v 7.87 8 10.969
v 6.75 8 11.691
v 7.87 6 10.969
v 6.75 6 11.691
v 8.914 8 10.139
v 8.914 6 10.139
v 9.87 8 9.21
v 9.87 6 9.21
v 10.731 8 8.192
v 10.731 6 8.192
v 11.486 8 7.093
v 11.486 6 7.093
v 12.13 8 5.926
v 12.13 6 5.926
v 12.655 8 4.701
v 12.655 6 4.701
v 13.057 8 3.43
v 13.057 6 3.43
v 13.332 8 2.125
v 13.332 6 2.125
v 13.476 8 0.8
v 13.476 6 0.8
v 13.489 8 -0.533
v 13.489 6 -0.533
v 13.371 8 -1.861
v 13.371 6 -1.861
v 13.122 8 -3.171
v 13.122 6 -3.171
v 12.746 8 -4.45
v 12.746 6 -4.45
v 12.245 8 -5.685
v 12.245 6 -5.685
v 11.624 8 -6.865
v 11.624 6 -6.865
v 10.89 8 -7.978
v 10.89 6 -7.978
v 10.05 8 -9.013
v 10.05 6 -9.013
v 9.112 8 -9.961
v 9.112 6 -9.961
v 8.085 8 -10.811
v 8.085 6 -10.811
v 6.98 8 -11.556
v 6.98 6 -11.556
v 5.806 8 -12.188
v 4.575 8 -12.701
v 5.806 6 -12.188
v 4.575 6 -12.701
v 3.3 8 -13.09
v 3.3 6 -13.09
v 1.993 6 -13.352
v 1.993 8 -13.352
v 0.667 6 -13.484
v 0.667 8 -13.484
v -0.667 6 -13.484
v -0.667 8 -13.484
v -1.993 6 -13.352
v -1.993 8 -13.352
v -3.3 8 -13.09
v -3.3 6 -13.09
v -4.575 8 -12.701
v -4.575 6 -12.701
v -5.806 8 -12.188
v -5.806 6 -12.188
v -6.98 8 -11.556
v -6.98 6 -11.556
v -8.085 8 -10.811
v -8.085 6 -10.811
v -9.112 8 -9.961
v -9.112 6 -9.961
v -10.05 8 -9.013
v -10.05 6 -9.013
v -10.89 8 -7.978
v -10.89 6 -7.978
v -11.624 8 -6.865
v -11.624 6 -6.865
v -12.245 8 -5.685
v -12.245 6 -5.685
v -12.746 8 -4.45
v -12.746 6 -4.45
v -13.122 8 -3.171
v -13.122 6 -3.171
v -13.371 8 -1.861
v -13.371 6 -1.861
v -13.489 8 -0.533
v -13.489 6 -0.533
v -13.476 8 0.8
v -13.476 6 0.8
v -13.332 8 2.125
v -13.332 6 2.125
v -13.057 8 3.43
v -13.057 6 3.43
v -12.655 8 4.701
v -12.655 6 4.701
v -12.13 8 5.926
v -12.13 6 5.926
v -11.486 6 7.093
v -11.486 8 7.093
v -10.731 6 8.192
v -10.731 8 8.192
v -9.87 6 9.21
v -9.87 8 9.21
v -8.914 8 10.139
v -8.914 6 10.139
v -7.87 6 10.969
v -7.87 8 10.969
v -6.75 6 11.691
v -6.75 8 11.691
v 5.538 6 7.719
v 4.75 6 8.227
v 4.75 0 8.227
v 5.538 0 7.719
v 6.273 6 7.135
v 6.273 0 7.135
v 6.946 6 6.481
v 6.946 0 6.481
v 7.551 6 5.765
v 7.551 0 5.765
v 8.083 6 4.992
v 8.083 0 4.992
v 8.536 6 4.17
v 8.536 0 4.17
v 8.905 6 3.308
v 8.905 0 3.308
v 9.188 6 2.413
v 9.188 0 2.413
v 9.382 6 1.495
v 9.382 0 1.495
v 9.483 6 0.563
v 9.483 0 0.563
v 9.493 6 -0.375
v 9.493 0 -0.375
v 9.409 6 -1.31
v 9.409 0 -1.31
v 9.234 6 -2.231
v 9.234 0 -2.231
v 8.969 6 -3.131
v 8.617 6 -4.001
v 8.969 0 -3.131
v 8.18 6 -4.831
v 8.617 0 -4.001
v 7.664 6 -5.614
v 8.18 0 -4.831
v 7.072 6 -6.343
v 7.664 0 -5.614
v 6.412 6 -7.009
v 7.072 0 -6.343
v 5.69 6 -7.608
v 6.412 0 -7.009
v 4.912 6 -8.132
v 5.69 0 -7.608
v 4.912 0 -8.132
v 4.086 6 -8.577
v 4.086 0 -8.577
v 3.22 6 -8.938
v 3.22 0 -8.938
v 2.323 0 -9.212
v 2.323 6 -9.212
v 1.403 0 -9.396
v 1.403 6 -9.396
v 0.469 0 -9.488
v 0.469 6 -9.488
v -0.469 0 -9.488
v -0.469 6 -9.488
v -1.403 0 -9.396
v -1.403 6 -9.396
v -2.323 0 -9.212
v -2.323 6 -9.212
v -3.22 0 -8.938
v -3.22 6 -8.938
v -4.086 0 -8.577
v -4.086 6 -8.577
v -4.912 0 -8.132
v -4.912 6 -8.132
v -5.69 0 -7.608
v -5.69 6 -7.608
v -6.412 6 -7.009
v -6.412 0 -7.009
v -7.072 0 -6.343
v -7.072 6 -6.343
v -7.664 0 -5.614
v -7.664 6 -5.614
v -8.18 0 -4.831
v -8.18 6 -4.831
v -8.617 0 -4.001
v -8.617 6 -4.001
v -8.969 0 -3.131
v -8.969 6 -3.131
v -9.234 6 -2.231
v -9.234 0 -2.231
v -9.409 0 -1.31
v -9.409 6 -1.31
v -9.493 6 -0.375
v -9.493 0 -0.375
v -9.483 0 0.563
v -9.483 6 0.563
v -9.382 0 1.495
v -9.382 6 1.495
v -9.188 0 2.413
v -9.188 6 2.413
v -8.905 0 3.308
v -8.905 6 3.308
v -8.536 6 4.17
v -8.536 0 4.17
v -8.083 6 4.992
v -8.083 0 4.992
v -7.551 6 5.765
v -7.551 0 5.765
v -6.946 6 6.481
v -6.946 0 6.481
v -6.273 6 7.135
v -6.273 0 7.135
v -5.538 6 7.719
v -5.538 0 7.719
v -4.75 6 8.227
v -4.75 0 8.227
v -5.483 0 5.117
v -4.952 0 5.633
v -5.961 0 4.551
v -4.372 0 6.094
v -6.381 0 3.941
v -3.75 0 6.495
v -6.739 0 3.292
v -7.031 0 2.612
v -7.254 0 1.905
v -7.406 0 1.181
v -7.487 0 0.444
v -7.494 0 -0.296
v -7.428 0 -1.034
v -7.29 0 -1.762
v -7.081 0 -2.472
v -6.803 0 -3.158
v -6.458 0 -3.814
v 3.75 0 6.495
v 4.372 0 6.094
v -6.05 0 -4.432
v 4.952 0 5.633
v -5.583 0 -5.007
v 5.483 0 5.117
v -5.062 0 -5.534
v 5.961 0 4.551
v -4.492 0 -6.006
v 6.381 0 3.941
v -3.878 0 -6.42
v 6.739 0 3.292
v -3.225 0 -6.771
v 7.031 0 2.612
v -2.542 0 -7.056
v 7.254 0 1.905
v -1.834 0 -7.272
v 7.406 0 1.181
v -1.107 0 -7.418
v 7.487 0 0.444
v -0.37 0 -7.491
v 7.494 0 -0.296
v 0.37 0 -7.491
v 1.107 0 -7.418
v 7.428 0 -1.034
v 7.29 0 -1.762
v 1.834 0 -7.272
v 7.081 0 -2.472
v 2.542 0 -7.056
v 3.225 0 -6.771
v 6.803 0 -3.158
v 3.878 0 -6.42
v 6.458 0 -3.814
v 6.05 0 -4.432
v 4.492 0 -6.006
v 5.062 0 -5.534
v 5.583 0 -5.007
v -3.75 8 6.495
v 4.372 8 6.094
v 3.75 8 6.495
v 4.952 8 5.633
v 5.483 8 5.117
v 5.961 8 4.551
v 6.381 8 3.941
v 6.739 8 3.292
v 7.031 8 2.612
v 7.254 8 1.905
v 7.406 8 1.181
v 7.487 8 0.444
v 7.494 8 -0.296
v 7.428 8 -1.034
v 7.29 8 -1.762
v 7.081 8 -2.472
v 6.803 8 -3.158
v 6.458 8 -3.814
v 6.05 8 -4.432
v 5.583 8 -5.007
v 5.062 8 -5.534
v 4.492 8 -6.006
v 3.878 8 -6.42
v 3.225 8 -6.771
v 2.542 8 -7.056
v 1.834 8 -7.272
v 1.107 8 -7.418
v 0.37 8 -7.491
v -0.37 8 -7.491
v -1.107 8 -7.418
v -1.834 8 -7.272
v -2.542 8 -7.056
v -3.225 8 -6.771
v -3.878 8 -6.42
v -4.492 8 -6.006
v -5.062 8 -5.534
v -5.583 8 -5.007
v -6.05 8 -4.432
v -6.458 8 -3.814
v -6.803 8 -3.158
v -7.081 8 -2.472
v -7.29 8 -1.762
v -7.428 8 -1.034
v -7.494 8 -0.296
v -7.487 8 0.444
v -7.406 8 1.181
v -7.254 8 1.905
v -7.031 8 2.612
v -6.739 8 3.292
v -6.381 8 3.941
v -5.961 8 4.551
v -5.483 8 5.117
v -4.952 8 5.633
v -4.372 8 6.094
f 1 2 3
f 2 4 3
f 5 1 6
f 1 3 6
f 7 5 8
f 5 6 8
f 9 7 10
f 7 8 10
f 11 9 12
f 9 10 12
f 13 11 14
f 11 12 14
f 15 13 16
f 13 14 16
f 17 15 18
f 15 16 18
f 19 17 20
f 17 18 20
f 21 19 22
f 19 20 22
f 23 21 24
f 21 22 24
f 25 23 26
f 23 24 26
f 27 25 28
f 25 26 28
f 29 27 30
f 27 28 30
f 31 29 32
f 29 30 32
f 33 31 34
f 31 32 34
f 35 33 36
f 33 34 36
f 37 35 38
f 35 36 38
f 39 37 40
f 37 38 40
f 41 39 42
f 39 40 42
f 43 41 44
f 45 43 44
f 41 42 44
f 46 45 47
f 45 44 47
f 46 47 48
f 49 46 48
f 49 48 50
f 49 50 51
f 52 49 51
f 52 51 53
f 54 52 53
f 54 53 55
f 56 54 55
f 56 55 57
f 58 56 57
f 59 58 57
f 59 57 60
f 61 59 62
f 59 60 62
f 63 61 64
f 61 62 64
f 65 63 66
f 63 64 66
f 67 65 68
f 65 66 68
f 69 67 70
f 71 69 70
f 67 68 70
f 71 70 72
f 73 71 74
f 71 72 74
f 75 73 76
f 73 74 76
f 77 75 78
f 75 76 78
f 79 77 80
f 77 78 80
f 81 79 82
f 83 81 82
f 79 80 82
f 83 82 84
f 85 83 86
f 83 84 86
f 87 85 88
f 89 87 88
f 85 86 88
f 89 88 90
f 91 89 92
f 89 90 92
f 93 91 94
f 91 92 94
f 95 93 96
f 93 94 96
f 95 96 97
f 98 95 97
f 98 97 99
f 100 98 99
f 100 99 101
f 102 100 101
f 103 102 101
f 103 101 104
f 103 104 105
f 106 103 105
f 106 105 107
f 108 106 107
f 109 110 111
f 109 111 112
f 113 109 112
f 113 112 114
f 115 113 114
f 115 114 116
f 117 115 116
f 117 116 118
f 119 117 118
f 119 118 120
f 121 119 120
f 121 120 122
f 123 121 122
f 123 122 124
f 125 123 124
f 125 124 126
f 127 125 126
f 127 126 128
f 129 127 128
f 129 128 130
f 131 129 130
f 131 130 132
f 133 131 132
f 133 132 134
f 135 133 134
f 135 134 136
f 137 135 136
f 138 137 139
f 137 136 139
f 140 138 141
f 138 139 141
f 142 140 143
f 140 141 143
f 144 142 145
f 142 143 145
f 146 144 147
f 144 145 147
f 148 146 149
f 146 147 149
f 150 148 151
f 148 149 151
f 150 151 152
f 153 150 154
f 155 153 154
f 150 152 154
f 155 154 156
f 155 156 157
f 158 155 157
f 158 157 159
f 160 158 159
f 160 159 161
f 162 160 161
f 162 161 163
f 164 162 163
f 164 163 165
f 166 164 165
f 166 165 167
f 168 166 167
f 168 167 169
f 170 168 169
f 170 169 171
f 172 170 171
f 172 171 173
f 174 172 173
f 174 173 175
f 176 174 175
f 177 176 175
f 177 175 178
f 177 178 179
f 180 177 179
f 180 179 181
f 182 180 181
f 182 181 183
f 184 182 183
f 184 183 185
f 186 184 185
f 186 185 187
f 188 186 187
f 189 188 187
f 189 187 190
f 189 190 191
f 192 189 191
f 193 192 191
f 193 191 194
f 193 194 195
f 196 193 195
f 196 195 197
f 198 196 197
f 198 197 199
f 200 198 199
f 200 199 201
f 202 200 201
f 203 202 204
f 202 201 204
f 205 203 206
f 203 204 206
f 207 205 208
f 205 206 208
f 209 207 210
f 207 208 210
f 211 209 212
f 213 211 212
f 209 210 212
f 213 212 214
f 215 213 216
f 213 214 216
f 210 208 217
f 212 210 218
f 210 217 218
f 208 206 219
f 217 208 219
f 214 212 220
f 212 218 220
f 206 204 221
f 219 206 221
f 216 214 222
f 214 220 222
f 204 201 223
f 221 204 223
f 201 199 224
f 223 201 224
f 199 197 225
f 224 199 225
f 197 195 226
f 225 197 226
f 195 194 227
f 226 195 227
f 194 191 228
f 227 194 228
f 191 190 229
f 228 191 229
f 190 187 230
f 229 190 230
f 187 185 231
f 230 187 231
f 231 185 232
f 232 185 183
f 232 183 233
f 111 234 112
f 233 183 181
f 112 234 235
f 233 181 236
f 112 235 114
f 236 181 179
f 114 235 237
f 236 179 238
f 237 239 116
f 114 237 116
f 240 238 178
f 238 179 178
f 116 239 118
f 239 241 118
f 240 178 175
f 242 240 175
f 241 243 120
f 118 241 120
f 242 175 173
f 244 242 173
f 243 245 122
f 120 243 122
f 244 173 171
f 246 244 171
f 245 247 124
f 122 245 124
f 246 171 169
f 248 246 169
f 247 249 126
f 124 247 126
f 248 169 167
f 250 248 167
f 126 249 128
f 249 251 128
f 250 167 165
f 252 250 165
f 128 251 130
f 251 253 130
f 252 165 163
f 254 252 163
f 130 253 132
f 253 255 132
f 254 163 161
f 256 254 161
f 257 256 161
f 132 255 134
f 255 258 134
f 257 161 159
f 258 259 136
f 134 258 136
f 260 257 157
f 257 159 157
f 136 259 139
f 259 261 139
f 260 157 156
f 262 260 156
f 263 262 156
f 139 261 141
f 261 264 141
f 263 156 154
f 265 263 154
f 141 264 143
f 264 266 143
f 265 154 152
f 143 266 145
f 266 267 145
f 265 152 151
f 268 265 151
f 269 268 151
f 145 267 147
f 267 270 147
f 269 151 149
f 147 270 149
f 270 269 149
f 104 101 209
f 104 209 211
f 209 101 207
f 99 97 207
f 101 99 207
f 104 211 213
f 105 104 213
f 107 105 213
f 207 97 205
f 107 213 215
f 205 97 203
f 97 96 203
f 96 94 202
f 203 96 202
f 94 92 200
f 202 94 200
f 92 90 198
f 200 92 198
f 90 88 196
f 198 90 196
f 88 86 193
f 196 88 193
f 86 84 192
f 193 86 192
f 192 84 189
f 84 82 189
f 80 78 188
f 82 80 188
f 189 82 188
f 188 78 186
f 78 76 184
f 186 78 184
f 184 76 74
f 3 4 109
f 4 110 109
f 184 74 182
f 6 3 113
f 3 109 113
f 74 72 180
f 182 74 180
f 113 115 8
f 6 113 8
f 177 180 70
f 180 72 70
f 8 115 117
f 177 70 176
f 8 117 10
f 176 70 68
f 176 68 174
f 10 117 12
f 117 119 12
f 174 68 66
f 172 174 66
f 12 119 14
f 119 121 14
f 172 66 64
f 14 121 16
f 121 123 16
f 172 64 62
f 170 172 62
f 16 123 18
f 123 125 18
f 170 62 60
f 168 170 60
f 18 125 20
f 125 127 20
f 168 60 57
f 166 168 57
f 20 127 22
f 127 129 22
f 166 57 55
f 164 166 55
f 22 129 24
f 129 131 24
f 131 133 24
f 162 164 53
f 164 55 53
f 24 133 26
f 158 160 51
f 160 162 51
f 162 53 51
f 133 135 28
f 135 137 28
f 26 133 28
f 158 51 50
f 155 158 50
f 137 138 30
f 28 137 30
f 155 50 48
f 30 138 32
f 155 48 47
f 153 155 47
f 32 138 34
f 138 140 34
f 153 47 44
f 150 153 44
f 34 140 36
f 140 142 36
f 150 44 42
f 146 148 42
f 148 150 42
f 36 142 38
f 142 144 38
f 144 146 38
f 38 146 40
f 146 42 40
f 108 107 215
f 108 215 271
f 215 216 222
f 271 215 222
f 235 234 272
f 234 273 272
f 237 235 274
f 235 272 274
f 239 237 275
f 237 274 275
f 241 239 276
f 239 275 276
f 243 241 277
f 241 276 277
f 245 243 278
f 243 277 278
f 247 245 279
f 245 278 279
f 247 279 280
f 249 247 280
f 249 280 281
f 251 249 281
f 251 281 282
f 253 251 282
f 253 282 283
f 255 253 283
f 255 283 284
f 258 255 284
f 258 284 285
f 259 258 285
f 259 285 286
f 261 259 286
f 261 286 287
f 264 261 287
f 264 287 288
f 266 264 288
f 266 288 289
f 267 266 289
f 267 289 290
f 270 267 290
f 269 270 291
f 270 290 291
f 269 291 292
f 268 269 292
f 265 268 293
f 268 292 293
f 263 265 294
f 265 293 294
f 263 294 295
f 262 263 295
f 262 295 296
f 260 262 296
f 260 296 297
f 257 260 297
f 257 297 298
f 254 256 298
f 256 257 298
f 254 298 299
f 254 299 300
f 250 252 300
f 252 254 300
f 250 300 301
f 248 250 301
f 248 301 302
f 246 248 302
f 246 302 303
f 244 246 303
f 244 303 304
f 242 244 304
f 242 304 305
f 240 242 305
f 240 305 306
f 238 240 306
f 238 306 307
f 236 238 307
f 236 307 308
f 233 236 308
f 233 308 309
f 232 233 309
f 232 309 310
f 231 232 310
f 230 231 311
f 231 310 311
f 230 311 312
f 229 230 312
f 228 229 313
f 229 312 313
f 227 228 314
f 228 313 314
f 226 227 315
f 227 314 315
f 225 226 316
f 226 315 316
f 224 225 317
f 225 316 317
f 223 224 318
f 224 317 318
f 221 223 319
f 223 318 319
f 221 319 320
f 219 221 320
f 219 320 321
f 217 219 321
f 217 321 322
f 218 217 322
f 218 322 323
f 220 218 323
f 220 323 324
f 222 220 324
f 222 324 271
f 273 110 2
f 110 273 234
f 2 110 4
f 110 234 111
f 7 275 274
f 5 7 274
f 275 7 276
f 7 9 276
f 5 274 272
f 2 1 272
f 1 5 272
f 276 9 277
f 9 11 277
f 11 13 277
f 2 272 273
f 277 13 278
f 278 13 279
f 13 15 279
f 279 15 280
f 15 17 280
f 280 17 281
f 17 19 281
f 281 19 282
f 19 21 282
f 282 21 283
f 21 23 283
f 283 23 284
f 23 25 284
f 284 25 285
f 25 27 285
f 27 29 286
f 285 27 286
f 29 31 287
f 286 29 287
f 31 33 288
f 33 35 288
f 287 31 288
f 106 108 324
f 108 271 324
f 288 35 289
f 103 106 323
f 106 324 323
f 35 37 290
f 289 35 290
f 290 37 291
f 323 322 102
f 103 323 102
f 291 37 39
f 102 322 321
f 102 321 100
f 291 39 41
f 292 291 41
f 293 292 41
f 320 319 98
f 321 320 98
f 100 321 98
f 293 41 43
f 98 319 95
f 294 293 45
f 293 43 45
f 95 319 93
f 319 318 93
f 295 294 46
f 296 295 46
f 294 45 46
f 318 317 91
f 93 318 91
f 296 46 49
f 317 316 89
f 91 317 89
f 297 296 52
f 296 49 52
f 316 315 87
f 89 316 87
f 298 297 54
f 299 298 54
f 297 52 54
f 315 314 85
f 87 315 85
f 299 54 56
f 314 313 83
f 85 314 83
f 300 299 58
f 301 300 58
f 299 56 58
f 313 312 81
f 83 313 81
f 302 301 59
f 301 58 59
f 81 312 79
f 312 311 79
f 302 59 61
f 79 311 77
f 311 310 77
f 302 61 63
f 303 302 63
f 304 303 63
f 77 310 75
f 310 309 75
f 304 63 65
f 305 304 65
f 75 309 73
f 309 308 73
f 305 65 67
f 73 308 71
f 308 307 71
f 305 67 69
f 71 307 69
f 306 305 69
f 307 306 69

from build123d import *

# Parameters (mm, degrees)
CUT_EXTRUDE1_DEPTH = 10


with BuildPart() as part:
    # Sketch1 → Revolve1 (revolve)
    with BuildSketch(Plane.XY):
        Polygon((7.5, 0), (7.5, 8), (13.5, 8), (13.5, 6), (9.5, 6), (9.5, 0), align=None)
    revolve(axis=Axis((0, 0, 0), (0, 1, 0)))

    # Sketch2 → Cut-Extrude1 (cut)
    with BuildSketch(Plane(origin=(0, 0, 0), x_dir=(1, 0, 0), z_dir=(0, 1, 0))):
        Polygon((-9.091166867, -15.746362913), (0, 0), (8.625529774, -14.939855811), align=None)
    extrude(amount=CUT_EXTRUDE1_DEPTH, mode=Mode.SUBTRACT)


solid = part.part
